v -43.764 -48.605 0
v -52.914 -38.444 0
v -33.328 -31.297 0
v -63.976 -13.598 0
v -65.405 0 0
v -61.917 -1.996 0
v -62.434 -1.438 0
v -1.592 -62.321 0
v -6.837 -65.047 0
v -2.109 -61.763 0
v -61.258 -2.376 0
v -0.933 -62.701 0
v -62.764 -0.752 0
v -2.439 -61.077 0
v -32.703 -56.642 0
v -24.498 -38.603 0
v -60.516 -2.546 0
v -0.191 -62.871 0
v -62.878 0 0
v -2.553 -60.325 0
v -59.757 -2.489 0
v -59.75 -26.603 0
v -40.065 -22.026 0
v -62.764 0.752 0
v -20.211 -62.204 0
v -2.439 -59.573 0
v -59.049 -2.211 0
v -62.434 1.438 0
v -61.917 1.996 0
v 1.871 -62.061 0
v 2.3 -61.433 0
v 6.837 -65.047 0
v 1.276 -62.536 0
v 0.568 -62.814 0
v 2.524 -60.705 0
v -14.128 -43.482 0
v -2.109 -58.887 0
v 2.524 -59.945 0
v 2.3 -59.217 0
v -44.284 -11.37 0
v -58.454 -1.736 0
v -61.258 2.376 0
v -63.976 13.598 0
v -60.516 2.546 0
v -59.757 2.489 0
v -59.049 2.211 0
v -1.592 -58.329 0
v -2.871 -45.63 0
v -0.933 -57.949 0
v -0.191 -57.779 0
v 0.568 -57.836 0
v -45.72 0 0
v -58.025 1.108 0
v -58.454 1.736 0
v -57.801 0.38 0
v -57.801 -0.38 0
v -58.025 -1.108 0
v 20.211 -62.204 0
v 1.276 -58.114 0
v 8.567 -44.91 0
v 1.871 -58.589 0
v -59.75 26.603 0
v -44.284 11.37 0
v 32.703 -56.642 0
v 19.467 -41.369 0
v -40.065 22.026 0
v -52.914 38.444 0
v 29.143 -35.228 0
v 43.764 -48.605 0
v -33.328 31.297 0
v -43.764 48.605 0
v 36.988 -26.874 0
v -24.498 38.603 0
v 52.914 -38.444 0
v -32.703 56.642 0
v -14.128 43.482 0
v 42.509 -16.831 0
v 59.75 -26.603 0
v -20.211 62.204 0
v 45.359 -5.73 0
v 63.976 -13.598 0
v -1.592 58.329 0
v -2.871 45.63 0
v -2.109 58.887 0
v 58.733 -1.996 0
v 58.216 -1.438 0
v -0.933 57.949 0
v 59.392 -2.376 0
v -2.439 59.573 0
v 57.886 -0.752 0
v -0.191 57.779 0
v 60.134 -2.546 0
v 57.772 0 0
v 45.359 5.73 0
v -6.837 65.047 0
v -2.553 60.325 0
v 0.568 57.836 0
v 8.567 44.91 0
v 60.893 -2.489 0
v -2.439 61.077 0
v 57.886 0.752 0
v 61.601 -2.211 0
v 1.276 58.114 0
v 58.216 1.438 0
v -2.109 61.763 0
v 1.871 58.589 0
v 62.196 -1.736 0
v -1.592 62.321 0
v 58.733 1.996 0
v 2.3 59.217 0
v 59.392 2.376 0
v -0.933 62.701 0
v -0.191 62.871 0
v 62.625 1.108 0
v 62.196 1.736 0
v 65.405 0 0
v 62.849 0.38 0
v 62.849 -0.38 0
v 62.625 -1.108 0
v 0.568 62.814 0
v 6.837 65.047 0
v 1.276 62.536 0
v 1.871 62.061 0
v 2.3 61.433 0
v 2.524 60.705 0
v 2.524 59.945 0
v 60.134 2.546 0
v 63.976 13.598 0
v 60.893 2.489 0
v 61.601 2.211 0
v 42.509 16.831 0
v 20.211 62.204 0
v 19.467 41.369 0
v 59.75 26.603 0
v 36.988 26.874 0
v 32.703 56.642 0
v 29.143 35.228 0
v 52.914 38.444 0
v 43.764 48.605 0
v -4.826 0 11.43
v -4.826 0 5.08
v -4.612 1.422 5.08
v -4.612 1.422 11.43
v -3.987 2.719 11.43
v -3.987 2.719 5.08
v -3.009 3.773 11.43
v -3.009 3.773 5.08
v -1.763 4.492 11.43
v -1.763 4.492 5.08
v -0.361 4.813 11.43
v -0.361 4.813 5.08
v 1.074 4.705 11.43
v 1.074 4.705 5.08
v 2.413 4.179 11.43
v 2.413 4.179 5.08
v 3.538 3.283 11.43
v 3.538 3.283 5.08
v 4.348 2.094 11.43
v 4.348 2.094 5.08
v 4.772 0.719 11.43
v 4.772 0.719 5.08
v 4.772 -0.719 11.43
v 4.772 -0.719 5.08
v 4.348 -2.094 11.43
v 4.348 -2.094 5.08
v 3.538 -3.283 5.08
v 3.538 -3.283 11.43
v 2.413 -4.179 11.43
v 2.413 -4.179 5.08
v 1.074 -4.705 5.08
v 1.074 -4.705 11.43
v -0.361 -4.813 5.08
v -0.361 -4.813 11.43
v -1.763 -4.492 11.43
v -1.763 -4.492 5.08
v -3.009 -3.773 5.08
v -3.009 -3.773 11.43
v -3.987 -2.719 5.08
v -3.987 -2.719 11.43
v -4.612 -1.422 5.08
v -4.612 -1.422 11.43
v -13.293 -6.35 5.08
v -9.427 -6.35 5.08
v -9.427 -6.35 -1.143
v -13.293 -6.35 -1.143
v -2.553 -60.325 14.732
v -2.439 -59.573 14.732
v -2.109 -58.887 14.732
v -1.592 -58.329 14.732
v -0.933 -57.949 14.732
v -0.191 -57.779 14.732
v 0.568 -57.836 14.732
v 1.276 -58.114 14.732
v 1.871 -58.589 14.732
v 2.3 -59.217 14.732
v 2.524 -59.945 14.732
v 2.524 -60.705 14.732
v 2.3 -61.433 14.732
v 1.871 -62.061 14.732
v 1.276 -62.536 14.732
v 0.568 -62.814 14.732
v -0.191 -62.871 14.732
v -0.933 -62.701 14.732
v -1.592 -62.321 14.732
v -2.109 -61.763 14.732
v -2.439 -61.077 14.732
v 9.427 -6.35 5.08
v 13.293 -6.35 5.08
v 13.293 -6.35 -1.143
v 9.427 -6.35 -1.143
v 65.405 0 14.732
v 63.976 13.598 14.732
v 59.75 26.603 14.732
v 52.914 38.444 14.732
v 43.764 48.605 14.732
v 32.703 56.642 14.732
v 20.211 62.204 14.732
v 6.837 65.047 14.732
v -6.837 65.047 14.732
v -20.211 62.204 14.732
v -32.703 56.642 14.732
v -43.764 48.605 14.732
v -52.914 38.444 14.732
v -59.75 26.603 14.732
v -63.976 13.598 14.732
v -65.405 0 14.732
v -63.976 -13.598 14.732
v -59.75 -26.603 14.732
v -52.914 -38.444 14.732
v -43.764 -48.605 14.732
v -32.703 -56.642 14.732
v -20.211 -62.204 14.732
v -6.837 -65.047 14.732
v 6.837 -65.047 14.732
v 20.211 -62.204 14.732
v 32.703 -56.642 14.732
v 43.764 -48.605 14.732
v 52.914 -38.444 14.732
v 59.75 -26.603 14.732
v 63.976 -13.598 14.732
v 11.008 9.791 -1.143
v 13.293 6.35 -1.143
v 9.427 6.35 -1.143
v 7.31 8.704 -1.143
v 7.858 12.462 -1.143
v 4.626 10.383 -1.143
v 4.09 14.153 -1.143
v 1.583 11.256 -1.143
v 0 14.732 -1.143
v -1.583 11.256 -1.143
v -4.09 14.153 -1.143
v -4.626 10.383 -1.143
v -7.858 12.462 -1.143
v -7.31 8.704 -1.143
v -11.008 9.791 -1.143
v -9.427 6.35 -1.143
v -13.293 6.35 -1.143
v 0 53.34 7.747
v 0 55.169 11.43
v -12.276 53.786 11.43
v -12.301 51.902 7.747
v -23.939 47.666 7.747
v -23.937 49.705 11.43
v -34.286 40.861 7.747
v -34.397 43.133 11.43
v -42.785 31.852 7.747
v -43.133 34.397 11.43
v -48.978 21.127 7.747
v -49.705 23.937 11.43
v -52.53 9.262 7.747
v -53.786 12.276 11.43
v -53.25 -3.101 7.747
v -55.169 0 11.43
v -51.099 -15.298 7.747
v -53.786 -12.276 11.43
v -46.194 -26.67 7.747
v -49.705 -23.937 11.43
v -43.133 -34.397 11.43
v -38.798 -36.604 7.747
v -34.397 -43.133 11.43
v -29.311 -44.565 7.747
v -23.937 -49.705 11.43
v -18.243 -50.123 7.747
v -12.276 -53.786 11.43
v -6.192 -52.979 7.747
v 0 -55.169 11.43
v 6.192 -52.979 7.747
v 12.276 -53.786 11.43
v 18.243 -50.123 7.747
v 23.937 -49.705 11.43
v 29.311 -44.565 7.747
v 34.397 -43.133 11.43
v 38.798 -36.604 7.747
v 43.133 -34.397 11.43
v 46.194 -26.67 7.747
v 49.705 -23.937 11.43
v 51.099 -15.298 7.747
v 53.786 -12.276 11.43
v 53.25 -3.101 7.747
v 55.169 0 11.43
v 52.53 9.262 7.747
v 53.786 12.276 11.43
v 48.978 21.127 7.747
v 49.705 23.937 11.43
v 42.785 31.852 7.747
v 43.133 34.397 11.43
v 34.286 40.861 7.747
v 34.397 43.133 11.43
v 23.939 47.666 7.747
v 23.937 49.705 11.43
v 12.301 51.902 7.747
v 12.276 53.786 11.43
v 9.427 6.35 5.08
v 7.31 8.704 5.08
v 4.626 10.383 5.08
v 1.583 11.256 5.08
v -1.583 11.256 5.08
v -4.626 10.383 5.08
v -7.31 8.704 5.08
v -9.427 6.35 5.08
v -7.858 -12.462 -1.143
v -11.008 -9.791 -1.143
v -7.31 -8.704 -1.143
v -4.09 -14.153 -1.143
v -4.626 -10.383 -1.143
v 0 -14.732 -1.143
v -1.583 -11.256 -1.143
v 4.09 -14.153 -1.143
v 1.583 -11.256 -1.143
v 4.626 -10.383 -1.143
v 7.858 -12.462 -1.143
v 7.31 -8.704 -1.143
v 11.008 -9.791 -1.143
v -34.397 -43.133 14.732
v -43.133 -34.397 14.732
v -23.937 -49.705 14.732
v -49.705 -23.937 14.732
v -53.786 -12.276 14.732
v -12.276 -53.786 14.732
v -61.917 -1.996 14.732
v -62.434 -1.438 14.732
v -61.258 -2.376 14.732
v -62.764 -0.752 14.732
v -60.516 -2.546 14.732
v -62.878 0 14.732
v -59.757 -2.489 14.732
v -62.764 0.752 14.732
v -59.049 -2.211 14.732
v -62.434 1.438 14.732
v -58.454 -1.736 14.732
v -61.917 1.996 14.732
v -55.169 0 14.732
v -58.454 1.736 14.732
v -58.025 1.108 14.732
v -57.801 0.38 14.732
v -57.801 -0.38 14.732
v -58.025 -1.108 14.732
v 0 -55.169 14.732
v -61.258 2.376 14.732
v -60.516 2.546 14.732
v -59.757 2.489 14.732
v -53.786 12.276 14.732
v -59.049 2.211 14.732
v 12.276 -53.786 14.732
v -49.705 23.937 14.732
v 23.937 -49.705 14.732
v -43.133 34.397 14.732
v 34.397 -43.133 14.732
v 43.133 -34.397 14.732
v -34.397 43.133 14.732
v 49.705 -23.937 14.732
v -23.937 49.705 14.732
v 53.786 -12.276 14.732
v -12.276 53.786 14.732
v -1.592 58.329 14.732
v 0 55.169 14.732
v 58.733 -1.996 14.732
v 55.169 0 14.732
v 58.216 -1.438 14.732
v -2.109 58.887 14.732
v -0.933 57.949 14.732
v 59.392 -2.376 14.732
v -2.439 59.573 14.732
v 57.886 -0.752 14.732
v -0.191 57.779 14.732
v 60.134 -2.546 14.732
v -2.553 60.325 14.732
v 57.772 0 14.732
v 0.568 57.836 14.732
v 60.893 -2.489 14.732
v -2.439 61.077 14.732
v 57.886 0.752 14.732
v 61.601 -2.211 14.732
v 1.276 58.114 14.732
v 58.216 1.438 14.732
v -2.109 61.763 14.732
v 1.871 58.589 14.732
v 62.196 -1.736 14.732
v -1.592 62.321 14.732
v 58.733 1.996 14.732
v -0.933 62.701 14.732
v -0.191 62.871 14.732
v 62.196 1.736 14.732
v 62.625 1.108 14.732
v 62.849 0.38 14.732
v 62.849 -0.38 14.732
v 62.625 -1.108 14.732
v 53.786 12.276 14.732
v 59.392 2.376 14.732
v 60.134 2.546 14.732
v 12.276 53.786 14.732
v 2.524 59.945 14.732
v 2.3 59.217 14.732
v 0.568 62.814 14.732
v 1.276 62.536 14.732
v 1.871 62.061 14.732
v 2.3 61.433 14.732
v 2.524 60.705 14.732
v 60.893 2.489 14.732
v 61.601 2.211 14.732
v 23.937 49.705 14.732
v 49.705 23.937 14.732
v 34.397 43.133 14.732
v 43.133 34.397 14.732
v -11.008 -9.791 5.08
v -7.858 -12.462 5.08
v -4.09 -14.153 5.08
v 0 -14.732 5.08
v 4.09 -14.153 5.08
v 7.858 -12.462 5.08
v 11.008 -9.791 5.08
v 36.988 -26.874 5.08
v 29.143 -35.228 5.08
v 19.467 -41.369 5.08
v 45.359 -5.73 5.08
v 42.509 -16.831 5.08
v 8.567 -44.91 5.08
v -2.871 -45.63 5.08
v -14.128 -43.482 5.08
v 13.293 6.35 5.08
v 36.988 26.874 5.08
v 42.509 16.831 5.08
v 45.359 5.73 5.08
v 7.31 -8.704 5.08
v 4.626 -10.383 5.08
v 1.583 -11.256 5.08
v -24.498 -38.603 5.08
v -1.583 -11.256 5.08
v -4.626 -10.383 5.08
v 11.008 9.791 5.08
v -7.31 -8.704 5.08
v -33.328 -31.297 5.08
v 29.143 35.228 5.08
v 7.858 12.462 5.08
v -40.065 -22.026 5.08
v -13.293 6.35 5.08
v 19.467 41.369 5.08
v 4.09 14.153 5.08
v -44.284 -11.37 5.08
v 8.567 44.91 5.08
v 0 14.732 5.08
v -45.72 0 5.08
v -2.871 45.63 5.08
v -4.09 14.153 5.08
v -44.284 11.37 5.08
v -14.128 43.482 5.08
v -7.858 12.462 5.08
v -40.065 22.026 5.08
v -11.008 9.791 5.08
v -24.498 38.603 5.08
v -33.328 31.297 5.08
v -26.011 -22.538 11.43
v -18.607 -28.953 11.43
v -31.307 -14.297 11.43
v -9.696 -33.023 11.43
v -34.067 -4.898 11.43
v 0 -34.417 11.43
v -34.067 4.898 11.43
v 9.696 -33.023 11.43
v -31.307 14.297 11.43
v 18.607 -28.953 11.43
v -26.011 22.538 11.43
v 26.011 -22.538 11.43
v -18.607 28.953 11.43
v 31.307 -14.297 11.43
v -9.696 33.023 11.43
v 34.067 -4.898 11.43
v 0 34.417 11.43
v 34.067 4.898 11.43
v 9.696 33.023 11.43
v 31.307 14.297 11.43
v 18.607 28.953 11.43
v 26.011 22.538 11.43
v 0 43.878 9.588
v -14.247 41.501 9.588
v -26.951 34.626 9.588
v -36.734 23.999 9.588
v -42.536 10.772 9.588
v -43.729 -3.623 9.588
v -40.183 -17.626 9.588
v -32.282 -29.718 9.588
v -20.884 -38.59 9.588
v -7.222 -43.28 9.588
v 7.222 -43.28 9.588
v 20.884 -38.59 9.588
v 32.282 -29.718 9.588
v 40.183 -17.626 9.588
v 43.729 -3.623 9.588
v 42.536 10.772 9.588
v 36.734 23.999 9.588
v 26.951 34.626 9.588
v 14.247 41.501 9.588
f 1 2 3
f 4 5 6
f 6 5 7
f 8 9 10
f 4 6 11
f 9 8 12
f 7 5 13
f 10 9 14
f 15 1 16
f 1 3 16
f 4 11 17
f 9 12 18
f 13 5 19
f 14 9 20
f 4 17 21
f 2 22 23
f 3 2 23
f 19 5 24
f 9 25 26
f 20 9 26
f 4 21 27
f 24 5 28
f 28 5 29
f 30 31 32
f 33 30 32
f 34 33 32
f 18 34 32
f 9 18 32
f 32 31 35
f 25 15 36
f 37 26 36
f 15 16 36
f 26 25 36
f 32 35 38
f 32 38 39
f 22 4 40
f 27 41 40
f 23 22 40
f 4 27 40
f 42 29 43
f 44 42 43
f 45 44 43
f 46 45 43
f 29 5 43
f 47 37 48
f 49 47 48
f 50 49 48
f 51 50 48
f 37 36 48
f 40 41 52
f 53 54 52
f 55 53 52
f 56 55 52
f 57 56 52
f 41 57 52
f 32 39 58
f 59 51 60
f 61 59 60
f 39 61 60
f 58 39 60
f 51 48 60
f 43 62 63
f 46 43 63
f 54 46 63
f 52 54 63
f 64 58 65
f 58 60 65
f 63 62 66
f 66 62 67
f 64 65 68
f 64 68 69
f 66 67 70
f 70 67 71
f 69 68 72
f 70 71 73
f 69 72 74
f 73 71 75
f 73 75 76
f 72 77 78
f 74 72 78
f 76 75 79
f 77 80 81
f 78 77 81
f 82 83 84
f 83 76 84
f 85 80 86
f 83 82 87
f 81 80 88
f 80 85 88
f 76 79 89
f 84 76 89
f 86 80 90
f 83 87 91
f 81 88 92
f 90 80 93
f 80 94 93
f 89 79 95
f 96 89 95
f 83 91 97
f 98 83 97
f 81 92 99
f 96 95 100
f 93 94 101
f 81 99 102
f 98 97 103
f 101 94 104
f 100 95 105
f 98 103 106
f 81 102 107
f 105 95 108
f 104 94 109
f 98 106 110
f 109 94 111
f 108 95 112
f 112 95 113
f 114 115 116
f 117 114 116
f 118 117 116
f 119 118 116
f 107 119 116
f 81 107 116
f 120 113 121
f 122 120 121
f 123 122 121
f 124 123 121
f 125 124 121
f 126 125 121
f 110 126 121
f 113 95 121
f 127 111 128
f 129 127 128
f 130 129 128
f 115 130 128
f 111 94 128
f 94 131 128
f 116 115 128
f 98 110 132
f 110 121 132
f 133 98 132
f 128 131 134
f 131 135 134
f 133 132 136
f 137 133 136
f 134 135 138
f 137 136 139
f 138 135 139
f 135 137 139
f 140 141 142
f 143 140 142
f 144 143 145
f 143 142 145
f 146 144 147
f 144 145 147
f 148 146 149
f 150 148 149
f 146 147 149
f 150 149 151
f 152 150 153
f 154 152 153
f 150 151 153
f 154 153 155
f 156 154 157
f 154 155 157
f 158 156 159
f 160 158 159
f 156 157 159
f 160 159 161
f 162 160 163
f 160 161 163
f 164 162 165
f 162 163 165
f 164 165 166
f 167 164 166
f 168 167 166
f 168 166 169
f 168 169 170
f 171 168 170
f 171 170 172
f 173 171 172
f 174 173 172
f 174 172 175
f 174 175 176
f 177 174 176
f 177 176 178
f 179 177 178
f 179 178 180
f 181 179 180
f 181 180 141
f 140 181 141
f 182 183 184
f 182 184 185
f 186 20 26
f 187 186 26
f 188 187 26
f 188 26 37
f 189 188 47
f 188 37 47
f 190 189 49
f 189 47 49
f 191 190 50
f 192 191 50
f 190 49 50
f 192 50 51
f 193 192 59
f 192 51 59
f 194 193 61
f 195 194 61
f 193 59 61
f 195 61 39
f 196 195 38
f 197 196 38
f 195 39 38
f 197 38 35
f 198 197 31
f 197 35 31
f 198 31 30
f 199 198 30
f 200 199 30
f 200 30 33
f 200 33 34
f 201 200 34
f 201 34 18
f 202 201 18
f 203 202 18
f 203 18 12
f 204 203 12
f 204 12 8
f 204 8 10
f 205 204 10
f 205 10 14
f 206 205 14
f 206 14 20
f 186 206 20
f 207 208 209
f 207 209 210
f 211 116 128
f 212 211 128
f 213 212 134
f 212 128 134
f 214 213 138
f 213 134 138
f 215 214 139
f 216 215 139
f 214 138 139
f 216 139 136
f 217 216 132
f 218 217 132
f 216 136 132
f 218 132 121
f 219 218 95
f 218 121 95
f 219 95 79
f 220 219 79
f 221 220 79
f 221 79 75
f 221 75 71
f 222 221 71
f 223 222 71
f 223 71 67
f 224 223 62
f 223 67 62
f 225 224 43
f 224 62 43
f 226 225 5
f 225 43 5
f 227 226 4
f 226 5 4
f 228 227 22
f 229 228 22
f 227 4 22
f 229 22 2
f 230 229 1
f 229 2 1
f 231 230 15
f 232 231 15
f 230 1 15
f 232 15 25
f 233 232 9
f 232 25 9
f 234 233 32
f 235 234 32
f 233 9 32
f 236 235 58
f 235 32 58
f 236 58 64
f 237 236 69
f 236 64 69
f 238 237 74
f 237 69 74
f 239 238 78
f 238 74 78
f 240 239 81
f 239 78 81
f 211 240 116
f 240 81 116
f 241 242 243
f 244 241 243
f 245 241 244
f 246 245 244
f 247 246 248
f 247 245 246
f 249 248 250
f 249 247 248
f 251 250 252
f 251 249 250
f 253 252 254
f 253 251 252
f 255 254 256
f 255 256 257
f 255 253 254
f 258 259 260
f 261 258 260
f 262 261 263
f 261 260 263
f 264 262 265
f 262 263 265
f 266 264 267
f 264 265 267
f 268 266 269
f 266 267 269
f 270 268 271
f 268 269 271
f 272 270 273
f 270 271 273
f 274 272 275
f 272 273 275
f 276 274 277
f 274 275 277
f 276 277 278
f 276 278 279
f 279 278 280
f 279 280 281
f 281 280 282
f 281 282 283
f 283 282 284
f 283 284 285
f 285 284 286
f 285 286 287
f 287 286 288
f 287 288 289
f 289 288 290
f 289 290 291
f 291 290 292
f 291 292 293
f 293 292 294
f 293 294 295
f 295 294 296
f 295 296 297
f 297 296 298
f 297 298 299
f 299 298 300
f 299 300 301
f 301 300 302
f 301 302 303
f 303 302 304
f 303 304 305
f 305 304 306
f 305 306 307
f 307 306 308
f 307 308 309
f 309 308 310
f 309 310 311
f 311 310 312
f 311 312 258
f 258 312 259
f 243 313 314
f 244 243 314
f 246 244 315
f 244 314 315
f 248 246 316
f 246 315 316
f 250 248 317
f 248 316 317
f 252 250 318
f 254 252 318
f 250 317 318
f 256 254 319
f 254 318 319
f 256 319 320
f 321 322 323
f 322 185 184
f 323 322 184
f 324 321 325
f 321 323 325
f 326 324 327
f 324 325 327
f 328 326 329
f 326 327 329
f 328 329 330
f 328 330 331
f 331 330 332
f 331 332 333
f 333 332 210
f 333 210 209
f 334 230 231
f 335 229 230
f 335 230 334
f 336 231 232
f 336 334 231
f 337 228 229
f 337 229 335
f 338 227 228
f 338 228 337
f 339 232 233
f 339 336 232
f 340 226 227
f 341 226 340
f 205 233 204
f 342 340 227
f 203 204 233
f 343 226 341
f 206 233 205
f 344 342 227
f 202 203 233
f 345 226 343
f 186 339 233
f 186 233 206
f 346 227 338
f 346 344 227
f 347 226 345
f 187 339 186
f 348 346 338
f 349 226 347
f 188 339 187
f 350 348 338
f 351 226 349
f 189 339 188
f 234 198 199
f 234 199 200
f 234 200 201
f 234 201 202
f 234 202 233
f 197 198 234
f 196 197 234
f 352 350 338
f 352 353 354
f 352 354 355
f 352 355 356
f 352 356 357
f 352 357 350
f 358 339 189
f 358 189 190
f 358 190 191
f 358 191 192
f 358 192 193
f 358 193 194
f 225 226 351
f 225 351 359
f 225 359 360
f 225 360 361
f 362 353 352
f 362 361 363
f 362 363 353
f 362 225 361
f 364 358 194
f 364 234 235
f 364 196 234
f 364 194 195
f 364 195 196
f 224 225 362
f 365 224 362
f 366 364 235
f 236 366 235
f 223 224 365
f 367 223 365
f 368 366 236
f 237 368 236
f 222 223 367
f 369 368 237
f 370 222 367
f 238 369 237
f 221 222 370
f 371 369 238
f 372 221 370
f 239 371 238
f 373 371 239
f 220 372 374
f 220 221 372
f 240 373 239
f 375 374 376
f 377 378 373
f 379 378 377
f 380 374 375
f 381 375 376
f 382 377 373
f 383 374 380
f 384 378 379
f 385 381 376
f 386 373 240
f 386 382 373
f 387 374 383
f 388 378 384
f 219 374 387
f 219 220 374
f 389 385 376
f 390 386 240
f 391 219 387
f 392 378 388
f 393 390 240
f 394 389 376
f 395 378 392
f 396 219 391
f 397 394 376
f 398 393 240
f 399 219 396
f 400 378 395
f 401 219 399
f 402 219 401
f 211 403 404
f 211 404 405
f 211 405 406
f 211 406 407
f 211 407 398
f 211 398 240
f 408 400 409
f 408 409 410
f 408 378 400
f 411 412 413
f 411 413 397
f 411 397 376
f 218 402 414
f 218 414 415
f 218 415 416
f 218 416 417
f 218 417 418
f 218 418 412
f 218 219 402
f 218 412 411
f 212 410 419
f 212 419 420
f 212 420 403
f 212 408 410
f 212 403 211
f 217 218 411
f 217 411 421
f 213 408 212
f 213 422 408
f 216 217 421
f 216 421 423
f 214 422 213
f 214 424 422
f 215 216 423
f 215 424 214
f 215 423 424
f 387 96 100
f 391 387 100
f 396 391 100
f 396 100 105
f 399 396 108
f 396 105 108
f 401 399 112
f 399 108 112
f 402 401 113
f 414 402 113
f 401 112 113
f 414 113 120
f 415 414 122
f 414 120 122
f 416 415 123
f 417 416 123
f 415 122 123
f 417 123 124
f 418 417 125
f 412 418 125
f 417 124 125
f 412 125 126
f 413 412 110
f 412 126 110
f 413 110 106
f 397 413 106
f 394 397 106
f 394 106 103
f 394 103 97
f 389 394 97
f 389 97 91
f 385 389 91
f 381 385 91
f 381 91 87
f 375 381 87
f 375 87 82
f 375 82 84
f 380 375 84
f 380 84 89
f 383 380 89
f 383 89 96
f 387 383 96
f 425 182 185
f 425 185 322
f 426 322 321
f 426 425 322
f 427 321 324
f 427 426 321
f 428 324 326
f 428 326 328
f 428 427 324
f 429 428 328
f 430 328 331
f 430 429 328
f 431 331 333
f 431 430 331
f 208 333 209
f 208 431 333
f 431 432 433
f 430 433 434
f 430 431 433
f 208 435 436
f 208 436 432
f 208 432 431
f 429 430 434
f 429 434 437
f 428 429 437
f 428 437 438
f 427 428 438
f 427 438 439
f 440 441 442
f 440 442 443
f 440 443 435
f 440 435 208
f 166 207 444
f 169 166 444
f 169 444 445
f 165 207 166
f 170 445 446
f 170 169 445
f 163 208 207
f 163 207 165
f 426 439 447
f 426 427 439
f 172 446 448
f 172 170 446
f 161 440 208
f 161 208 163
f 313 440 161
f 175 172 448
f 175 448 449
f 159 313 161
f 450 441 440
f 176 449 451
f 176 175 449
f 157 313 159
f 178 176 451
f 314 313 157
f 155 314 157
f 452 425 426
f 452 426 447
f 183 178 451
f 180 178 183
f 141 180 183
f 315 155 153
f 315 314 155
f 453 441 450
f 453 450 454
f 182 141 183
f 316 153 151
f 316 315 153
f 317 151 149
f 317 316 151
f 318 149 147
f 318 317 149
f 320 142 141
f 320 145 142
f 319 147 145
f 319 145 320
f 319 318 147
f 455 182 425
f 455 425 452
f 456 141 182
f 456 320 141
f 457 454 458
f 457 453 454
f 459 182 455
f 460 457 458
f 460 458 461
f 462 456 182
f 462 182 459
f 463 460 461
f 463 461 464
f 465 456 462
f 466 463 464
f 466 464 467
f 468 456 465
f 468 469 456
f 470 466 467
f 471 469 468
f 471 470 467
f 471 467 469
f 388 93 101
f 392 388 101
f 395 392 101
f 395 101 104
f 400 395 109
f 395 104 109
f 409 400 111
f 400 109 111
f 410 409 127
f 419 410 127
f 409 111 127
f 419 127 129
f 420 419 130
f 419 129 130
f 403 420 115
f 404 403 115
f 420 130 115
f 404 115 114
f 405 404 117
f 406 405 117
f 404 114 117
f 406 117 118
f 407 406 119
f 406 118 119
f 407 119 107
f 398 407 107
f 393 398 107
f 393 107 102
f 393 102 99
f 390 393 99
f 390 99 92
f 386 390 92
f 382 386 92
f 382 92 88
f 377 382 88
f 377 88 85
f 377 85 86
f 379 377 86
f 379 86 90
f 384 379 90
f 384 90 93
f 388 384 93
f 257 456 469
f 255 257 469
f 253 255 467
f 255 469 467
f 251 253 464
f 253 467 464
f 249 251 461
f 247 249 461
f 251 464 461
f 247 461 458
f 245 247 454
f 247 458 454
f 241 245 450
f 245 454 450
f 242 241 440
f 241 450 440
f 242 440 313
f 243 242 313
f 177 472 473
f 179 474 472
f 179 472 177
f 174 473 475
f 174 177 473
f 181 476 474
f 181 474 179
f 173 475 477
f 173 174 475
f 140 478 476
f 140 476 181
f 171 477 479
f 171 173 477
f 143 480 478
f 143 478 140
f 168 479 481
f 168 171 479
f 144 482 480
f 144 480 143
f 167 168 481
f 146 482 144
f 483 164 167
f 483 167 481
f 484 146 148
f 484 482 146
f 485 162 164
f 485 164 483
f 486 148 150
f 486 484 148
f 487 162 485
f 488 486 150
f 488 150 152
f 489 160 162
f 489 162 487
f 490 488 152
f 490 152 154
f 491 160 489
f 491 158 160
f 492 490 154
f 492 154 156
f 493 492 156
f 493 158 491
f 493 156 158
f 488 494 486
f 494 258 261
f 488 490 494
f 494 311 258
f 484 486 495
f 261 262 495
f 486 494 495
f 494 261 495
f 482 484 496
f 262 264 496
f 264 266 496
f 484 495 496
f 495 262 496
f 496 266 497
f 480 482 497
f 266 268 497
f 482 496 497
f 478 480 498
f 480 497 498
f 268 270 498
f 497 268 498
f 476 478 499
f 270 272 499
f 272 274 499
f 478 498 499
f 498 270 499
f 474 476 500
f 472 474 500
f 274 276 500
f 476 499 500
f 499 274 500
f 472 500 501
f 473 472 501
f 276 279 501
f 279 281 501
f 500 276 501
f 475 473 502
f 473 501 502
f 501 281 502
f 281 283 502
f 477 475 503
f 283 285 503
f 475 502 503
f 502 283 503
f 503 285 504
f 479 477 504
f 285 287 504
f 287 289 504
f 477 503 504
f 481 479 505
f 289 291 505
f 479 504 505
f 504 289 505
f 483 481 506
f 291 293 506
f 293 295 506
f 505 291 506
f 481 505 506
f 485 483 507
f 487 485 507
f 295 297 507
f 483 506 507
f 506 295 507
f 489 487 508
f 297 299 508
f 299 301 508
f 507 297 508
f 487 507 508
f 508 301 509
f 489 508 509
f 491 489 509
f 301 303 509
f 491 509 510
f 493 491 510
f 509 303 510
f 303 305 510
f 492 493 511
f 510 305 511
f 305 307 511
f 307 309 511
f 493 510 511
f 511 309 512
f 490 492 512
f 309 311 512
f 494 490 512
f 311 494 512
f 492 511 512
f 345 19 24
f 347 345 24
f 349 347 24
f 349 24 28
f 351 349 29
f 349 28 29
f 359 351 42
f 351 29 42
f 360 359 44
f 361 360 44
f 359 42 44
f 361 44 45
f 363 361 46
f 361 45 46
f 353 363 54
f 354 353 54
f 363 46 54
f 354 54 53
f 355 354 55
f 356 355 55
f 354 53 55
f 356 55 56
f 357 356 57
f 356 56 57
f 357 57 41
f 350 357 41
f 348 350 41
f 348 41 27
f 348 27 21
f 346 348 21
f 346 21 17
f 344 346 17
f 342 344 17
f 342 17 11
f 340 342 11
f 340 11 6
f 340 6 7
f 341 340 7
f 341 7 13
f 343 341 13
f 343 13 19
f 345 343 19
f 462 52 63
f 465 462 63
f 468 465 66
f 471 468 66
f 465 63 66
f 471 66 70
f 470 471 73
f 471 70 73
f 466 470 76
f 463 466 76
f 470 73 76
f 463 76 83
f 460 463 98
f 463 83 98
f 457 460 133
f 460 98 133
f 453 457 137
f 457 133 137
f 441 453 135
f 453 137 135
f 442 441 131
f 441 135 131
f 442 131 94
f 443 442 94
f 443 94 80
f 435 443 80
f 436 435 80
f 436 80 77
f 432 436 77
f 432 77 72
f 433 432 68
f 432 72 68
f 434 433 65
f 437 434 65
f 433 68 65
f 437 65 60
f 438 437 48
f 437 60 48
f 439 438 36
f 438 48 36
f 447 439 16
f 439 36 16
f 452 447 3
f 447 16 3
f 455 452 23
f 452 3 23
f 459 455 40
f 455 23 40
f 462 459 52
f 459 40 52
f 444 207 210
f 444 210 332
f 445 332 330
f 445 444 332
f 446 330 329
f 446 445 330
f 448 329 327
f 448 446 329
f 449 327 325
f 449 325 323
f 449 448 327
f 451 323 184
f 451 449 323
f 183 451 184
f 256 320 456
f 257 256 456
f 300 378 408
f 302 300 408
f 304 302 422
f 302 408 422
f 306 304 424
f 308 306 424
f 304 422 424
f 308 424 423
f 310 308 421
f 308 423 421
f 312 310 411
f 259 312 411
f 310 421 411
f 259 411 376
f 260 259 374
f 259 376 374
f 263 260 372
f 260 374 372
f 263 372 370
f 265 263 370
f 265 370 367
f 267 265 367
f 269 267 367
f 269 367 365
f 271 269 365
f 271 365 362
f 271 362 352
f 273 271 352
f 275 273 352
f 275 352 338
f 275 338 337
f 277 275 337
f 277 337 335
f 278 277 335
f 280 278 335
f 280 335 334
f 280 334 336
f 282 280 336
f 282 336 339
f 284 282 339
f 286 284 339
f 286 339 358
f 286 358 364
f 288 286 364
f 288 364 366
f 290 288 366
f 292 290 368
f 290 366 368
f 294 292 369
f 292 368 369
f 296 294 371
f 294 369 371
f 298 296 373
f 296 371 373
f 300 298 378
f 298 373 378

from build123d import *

# Parameters (mm, degrees)
SKETCH1_R               = 65.405
BOSS_EXTRUDE1_DEPTH     = 14.732
SKETCH2_R               = 55.1688
CUT_EXTRUDE1_DEPTH      = 3.302
F_1_4_20_TAPPED_HOLE1_D = 5.1054
SKETCH6_R               = 45.72
CUT_EXTRUDE2_DEPTH      = 5.08
SKETCH7_R               = 4.826
CUT_EXTRUDE3_DEPTH      = 10.652
BOSS_EXTRUDE2_DEPTH     = 6.223


with BuildPart() as part:
    # Sketch1 → Boss-Extrude1 (new body)
    with BuildSketch(Plane.XY):
        Circle(SKETCH1_R)
    extrude(amount=BOSS_EXTRUDE1_DEPTH)

    # Sketch2 → Cut-Extrude1 (cut)
    with BuildSketch(Plane.XY.offset(14.732)):
        Circle(SKETCH2_R)
    extrude(amount=-CUT_EXTRUDE1_DEPTH, mode=Mode.SUBTRACT)

    # Sketch3 → Cut-Revolve1 (revolve, cut)
    with BuildSketch(Plane(origin=(0, 0, 0), x_dir=(0, 0, -1), z_dir=(1, 0, 0))):
        Polygon((-11.43, 34.417), (-7.747, 53.34), (-11.43, 55.1688), align=None)
    revolve(axis=Axis((0, 0, 0), (0, 0, 1)), mode=Mode.SUBTRACT)

    # 1/4-20 Tapped Hole1 (through all)
    with Locations(Plane.XY.offset(14.732)):
        with Locations((0, 60.325), (60.325, 0), (0, -60.325), (-60.325, 0)):
            Hole(F_1_4_20_TAPPED_HOLE1_D / 2)

    # Sketch6 → Cut-Extrude2 (cut)
    with BuildSketch(Plane(origin=(0, 0, 0), x_dir=(-1, 0, 0), z_dir=(0, 0, -1))):
        Circle(SKETCH6_R)
    extrude(amount=-CUT_EXTRUDE2_DEPTH, mode=Mode.SUBTRACT)

    # Sketch7 → Cut-Extrude3 (cut, through all)
    with BuildSketch(Plane(origin=(0, 0, 5.08), x_dir=(-1, 0, 0), z_dir=(0, 0, -1))):
        Circle(SKETCH7_R)
    extrude(amount=-CUT_EXTRUDE3_DEPTH, mode=Mode.SUBTRACT)

    # Sketch8 → Boss-Extrude2 (add)
    with BuildSketch(Plane(origin=(0, 0, 5.08), x_dir=(-1, 0, 0), z_dir=(0, 0, -1))):
        with BuildLine():
            Line((-13.293205934, -6.35), (-9.42734439, -6.35))
            ThreePointArc((-9.42734439, -6.35), (0, -11.3665), (9.42734439, -6.35))
            Line((9.42734439, -6.35), (13.293205934, -6.35))
            ThreePointArc((13.293205934, -6.35), (0, -14.732), (-13.293205934, -6.35))
        make_face()
        with BuildLine():
            Line((-13.293205934, 6.35), (-9.42734439, 6.35))
            ThreePointArc((-9.42734439, 6.35), (0, 11.3665), (9.42734439, 6.35))
            Line((9.42734439, 6.35), (13.293205934, 6.35))
            ThreePointArc((13.293205934, 6.35), (0, 14.732), (-13.293205934, 6.35))
        make_face()
    extrude(amount=BOSS_EXTRUDE2_DEPTH)


solid = part.part
